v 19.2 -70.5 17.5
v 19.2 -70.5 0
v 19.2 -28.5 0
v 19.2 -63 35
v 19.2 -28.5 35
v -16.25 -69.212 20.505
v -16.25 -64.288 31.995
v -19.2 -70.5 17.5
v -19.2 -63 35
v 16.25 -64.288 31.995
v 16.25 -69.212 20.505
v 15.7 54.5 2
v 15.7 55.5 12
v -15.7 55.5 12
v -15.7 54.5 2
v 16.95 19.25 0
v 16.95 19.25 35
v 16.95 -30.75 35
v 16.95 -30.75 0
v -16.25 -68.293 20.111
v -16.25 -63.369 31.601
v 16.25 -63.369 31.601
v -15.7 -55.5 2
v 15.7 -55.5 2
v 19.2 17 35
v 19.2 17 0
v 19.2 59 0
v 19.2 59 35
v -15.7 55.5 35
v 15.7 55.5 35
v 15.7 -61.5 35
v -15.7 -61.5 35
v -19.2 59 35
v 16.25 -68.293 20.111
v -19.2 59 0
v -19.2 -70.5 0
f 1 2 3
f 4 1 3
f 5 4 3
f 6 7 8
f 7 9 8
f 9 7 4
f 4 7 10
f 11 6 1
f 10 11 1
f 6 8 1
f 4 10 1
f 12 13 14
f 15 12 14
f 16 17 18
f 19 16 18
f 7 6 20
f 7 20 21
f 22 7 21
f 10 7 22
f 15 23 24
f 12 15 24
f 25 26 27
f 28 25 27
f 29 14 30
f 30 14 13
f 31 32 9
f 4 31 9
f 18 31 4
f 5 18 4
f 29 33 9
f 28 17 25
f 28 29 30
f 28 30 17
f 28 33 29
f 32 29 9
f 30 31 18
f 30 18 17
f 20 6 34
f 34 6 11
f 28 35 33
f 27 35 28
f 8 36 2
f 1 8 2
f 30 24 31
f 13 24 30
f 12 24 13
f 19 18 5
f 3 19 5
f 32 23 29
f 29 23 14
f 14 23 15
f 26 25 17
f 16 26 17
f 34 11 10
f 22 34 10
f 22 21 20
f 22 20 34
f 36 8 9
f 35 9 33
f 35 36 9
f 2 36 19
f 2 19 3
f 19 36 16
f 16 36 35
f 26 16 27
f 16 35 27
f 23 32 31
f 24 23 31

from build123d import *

# Parameters (mm, degrees)
F0_W     = 38.4
F0_H     = 129.5
F0_W_2   = 31.4
F0_H_2   = 111
F1_DEPTH = 2
F2_DEPTH = 35
F3_SIZE2 = 17.5
F3_SIZE  = 7.5
F4_SIZE2 = 32.99999
F4_SIZE  = 5.99999
F6_DEPTH = 35.001
F7_W     = 32.5
F7_H     = 12.5
F8_DEPTH = 1
F9_SIZE2 = 10
F9_SIZE  = 1


# Not quite as in the source:
# - a fillet or chamfer is up to 0.001 mm smaller than in the source, because OpenCascade refuses the exact size


with BuildPart() as f1:
    # F0 (on Top) → F1 (new body)
    with BuildSketch(Plane.XY):
        with Locations((0, -5.75)):
            Rectangle(F0_W, F0_H)
        Rectangle(F0_W_2, F0_H_2, mode=Mode.SUBTRACT)
        Rectangle(F0_W_2, F0_H_2)
    extrude(amount=F1_DEPTH)

    # F0 (on Top) → F2 (join)
    with BuildSketch(Plane.XY):
        with Locations((0, -5.75)):
            Rectangle(F0_W, F0_H)
        Rectangle(F0_W_2, F0_H_2, mode=Mode.SUBTRACT)
    extrude(amount=F2_DEPTH)

    # F3
    f3_edges = [f1.edges().sort_by_distance(p)[0] for p in [
        (0, -70.5, 35),
    ]]
    f3_side = f1.faces().sort_by_distance((0, -69.149266, 35))[0]
    chamfer(f3_edges, length=F3_SIZE, length2=F3_SIZE2, reference=f3_side)

    # F4 (size 6 and 33 in the source; OpenCascade refuses exactly that, so slightly less here)
    f4_edges = [f1.edges().sort_by_distance(p)[0] for p in [
        (0, -55.5, 35),
    ]]
    f4_side = f1.faces().sort_by_distance((17.920994, -2, 35))[0]
    chamfer(f4_edges, length=F4_SIZE, length2=F4_SIZE2, reference=f4_side)

    # F5 (on face) → F6 (cut, through all)
    with BuildSketch(Plane.XY.offset(35)):
        Polygon((19.2, -28.5), (19.2, 17), (16.95, 19.25), (16.95, -30.75), align=None)
    extrude(amount=-F6_DEPTH, mode=Mode.SUBTRACT)

    # F7 (on face) → F8 (cut)
    with BuildSketch(Plane(origin=(0, -65.8965517241, 28.2413793103), x_dir=(1, 0, 0), z_dir=(0, -0.91914503, 0.3939192986))):
        with Locations((0, -2.1665561422)):
            Rectangle(F7_W, F7_H)
    extrude(amount=-F8_DEPTH, mode=Mode.SUBTRACT)

    # F9
    f9_edges = [f1.edges().sort_by_distance(p)[0] for p in [
        (0, 55.5, 2),
    ]]
    f9_side = f1.faces().sort_by_distance((0, 0, 2))[0]
    chamfer(f9_edges, length=F9_SIZE, length2=F9_SIZE2, reference=f9_side)


solid = f1.part
